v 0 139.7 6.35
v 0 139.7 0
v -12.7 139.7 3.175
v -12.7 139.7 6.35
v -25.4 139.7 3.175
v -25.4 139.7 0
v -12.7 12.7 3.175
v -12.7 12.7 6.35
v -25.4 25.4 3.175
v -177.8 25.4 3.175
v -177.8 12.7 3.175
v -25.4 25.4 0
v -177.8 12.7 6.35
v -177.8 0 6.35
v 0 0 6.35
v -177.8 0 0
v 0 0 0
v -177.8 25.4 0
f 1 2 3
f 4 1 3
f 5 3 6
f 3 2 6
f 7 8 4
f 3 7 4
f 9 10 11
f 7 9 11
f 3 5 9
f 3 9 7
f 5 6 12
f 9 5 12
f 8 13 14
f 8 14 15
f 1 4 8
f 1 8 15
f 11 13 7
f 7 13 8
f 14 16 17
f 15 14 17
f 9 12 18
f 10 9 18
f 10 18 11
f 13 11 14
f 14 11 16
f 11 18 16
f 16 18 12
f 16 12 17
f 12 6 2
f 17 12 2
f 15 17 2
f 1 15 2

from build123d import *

# Parameters (mm, degrees)
F1_DEPTH = 6.35
F3_DEPTH = 3.175


with BuildPart() as f1:
    # F0 (on Top) → F1 (new body)
    with BuildSketch(Plane.XY):
        Polygon((-177.8, 0), (0, 0), (0, 139.7), (-25.4, 139.7), (-25.4, 25.4), (-177.8, 25.4), align=None)
    extrude(amount=F1_DEPTH)

    # F2 (on face) → F3 (cut)
    with BuildSketch(Plane.XY.offset(6.35)):
        Polygon((-177.8, 25.4), (-177.8, 12.7), (-25.4, 12.7), (-12.7, 12.7), (-12.7, 25.4), (-12.7, 139.7), (-25.4, 139.7), (-25.4, 25.4), align=None)
    extrude(amount=-F3_DEPTH, mode=Mode.SUBTRACT)


solid = f1.part
